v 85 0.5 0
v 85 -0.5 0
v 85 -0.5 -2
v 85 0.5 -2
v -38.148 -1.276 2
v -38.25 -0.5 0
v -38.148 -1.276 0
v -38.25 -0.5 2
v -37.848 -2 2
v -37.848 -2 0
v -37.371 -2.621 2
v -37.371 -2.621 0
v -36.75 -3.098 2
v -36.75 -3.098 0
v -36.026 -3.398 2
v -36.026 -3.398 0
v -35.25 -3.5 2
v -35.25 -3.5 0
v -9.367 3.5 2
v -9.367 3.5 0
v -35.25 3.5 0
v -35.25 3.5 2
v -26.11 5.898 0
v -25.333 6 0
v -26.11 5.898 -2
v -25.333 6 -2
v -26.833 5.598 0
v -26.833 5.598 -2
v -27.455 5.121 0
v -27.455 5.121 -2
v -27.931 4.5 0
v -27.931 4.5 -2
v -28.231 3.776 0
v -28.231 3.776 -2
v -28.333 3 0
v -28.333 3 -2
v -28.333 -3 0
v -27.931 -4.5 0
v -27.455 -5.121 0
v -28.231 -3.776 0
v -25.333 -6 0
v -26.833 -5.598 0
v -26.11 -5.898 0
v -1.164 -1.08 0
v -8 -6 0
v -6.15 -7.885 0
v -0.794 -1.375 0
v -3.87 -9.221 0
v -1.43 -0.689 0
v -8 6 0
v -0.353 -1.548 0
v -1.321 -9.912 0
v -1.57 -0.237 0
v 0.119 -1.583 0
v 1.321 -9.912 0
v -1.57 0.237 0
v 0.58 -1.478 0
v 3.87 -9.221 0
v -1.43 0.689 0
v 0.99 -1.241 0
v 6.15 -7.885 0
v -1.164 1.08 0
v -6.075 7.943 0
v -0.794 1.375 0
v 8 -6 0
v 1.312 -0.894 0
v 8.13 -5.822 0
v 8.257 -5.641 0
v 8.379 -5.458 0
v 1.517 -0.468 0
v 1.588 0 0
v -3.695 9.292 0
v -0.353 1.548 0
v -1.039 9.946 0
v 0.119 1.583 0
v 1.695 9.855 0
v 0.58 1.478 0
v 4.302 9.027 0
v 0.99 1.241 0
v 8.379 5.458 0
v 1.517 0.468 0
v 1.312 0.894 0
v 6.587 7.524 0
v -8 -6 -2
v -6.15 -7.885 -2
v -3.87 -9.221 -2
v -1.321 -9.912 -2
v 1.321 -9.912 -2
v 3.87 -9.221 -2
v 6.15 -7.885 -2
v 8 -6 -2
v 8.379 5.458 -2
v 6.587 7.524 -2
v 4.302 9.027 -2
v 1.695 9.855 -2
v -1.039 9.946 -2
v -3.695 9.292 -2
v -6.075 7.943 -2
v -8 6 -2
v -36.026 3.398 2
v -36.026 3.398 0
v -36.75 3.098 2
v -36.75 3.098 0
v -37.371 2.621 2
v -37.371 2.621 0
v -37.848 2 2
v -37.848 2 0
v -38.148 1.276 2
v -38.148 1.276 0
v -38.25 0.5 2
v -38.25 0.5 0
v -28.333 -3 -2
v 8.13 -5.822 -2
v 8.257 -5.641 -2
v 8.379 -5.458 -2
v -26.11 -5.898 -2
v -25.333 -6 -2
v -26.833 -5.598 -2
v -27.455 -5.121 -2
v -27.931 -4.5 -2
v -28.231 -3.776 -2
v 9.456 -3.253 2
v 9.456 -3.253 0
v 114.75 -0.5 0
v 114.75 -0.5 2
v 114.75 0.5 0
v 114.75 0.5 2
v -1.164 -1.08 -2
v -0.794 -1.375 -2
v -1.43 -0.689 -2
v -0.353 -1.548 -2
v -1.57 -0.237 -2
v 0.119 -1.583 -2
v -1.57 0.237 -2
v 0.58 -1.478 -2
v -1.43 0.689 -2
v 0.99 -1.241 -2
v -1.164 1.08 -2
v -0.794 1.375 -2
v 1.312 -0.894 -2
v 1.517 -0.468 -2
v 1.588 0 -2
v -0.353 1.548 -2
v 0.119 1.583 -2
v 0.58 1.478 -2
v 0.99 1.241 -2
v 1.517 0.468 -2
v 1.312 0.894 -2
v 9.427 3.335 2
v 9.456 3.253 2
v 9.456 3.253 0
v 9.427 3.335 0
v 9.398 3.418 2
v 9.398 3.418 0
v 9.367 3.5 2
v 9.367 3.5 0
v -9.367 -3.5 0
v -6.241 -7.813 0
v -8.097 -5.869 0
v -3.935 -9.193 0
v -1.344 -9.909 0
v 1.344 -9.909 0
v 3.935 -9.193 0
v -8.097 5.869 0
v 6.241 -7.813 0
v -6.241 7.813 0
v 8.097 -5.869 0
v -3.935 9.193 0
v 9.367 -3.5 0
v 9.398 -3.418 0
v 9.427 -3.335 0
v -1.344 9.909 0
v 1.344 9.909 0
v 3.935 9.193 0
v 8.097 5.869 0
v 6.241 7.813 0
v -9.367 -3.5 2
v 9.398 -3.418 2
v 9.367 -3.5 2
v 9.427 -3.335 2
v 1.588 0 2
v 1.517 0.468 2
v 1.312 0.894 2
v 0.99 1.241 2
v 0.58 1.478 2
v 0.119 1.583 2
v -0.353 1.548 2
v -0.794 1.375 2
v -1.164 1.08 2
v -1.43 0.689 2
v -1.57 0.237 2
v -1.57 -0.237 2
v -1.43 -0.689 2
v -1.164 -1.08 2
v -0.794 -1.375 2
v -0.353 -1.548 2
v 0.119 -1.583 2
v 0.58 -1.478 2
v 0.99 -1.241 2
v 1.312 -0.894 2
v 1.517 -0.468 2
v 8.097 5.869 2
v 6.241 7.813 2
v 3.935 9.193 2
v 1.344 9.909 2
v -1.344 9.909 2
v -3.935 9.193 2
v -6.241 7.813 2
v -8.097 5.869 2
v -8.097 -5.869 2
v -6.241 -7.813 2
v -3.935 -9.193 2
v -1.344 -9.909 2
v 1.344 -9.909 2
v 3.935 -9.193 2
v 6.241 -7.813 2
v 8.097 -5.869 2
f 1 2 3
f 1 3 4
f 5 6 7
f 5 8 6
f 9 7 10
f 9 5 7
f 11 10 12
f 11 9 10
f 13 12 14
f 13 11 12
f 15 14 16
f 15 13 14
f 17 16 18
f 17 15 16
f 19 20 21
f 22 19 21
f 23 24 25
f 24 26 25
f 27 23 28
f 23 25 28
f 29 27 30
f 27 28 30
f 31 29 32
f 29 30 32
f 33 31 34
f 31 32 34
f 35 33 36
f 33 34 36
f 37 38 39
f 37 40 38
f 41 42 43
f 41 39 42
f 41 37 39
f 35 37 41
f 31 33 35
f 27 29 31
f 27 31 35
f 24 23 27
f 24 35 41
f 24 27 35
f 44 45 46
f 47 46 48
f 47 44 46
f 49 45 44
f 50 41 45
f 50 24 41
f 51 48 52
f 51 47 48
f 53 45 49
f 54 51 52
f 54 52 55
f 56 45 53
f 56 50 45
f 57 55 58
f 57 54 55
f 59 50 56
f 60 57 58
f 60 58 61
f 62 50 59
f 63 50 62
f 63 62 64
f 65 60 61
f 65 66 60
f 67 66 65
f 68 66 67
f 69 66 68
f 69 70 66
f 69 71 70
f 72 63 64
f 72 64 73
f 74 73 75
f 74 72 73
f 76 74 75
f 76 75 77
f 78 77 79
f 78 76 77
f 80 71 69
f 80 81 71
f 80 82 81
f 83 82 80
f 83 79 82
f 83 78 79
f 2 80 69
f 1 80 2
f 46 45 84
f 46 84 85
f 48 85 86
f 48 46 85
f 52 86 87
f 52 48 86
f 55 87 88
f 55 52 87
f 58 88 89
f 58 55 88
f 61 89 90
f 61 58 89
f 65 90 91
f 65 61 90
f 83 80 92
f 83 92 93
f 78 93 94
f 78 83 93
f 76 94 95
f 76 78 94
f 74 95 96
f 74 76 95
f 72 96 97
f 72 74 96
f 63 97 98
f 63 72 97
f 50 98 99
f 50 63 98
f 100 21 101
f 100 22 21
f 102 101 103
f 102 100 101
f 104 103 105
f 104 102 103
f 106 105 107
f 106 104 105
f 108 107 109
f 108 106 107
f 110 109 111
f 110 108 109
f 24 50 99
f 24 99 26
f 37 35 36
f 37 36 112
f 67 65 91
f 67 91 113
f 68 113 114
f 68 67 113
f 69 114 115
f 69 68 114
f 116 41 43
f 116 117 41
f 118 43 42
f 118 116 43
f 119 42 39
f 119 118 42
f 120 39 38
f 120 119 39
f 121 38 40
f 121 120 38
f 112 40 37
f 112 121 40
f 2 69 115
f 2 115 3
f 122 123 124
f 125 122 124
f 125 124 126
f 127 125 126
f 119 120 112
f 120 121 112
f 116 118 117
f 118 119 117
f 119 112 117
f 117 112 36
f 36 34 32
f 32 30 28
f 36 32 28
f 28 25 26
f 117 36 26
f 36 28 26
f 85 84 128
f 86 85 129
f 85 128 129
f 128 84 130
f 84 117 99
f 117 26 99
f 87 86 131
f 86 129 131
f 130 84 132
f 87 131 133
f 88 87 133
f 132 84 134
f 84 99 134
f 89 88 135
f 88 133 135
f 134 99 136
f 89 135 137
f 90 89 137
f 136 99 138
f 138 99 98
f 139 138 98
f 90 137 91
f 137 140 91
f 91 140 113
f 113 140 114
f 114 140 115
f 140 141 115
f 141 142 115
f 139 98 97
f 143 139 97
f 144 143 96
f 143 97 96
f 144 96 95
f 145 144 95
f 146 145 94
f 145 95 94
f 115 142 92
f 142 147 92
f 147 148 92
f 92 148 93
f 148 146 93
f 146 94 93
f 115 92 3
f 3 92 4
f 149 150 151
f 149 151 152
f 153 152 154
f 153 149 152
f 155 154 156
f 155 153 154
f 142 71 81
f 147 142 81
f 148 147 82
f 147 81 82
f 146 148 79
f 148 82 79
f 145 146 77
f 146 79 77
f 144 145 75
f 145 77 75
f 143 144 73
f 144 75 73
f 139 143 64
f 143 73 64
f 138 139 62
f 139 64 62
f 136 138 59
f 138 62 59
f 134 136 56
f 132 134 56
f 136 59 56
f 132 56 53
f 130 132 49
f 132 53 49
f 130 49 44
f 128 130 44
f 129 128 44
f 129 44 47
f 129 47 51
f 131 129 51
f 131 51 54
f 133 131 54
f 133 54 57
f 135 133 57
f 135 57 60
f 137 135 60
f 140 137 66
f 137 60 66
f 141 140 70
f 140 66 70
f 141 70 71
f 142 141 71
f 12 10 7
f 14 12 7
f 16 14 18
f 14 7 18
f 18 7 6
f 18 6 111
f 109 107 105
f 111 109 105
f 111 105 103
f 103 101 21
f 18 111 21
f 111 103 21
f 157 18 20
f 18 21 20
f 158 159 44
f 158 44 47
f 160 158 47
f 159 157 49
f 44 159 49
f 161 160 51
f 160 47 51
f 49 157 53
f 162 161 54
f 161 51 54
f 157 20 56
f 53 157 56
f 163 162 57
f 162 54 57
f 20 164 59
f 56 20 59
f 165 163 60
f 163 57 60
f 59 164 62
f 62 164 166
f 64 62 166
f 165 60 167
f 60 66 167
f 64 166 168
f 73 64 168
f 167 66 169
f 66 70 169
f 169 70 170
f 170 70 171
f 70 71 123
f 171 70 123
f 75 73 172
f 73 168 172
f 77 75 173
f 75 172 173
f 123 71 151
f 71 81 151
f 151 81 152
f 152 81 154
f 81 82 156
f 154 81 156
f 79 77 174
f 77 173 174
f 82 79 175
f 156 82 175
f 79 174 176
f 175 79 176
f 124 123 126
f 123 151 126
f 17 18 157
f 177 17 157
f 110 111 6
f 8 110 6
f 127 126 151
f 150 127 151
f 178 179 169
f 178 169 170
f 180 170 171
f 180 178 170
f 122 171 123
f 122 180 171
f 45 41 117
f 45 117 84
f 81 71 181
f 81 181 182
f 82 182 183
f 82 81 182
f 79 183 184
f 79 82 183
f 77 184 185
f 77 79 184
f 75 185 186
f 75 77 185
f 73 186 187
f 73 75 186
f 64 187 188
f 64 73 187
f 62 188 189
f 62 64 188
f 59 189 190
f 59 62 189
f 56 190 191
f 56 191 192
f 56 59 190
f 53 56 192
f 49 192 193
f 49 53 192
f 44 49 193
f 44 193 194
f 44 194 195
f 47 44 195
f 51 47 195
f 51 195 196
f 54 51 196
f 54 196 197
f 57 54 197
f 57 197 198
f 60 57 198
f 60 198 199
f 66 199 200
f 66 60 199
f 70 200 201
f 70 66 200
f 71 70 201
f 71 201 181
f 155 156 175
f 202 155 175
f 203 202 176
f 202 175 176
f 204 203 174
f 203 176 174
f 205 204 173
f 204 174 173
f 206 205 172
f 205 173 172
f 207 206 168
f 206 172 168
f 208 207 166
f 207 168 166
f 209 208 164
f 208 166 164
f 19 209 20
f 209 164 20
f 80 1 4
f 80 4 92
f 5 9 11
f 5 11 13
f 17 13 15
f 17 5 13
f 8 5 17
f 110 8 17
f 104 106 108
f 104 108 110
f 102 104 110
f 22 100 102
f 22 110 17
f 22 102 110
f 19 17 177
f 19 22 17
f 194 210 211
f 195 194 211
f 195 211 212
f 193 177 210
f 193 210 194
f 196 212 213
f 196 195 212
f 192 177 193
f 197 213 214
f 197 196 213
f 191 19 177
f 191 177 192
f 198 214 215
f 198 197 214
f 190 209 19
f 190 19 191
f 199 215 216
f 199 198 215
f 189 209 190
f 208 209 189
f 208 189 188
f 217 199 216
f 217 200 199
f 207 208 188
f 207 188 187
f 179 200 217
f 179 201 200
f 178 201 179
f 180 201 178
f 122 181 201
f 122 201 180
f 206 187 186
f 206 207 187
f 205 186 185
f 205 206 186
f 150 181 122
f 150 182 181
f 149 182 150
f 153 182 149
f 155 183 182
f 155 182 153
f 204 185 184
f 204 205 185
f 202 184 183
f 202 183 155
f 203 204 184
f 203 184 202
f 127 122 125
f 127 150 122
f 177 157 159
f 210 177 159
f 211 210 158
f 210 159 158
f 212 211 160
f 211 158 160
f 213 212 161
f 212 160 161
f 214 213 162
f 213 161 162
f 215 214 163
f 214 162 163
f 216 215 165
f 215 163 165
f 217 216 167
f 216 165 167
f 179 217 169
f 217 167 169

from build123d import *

# Parameters (mm, degrees)
F4_R         = 1.5875
F5_DEPTH     = 2
F6_R         = 1.5875
F7_DEPTH     = 2
F8_T4_DEPTH  = 443.9658863068
F8_S5_R      = 10
F8_T6_DEPTH  = 228
F8_T10_DEPTH = 443.9658863068
F8_S11_R     = 10
F8_T12_DEPTH = 228
F9_T4_DEPTH  = 598.692462338
F9_S5_R      = 10
F9_T6_DEPTH  = 306
F9_T10_DEPTH = 598.692462338
F9_S11_R     = 10
F9_T12_DEPTH = 306
F10_R        = 3
F10_2_R      = 3


# Not quite as in the source:
# - a fillet or chamfer that OpenCascade refuses, or shapes differently, is made with other operations: its cross-section is extruded or revolved along the edge and cut away or added


with BuildPart() as f5:
    # F4 (on Top) → F5 (new body)
    with BuildSketch(Plane.XY):
        with BuildLine():
            Line((-9.3674969976, 3.5), (-38.25, 3.5))
            Line((-38.25, 3.5), (-38.25, -3.5))
            Line((-38.25, -3.5), (-9.3674969976, -3.5))
            ThreePointArc((-9.3674969976, -3.5), (-10, 0), (-9.3674969976, 3.5))
        make_face()
        with BuildLine():
            ThreePointArc((9.3674969976, 3.5), (0, 10), (-9.3674969976, 3.5))
            Line((-9.3674969976, 3.5), (9.3674969976, 3.5))
        make_face()
        with BuildLine():
            Line((9.3674969976, 3.5), (-9.3674969976, 3.5))
            ThreePointArc((-9.3674969976, 3.5), (-10, 0), (-9.3674969976, -3.5))
            Line((-9.3674969976, -3.5), (9.3674969976, -3.5))
            ThreePointArc((9.3674969976, -3.5), (9.8406038935, -1.7783461452), (10, 0))
            ThreePointArc((10, 0), (9.8406038935, 1.7783461452), (9.3674969976, 3.5))
        make_face()
        Circle(F4_R, mode=Mode.SUBTRACT)
        with BuildLine():
            Line((114.75, 3.5), (9.3674969976, 3.5))
            ThreePointArc((9.3674969976, 3.5), (9.8406038935, 1.7783461452), (10, 0))
            ThreePointArc((10, 0), (9.8406038935, -1.7783461452), (9.3674969976, -3.5))
            Line((9.3674969976, -3.5), (114.75, -3.5))
            Line((114.75, -3.5), (114.75, 3.5))
        make_face()
        with BuildLine():
            Line((9.3674969976, -3.5), (-9.3674969976, -3.5))
            ThreePointArc((-9.3674969976, -3.5), (0, -10), (9.3674969976, -3.5))
        make_face()
    extrude(amount=F5_DEPTH)

    # F9: chamfer of 114.75 x 3 on 2 edges, made by hand


with BuildPart() as f7:
    # F6 (on Top) → F7 (new body)
    with BuildSketch(Plane.XY):
        with BuildLine():
            Line((-8, 6), (-28.3333333333, 6))
            Line((-28.3333333333, 6), (-28.3333333333, -6))
            Line((-28.3333333333, -6), (-8, -6))
            ThreePointArc((-8, -6), (-10, 0), (-8, 6))
        make_face()
        with BuildLine():
            ThreePointArc((8, 6), (0, 10), (-8, 6))
            Line((-8, 6), (8, 6))
        make_face()
        with BuildLine():
            Line((8, 6), (-8, 6))
            ThreePointArc((-8, 6), (-10, 0), (-8, -6))
            Line((-8, -6), (8, -6))
            ThreePointArc((8, -6), (9.4868329805, -3.1622776602), (10, 0))
            ThreePointArc((10, 0), (9.4868329805, 3.1622776602), (8, 6))
        make_face()
        Circle(F6_R, mode=Mode.SUBTRACT)
        with BuildLine():
            Line((85, 6), (8, 6))
            ThreePointArc((8, 6), (9.4868329805, 3.1622776602), (10, 0))
            ThreePointArc((10, 0), (9.4868329805, -3.1622776602), (8, -6))
            Line((8, -6), (85, -6))
            Line((85, -6), (85, 6))
        make_face()
        with BuildLine():
            Line((8, -6), (-8, -6))
            ThreePointArc((-8, -6), (0, -10), (8, -6))
        make_face()
    extrude(amount=-F7_DEPTH)

    # F8: chamfer of 85 x 5.5 on 2 edges, made by hand


with BuildPart() as f8_tool2:
    # F8_s3 → F8_t4 (new body)
    with BuildSketch(Plane.XY.offset(220.9829431534)):
        Polygon((0, -6), (85, -0.5), (85, -6), align=None)
    extrude(amount=-F8_T4_DEPTH)

    # F8_s5 → F8_t6 (cut, symmetric)
    with BuildSketch(Plane.XY.offset(-1)):
        Circle(F8_S5_R)
    extrude(amount=F8_T6_DEPTH, both=True, mode=Mode.SUBTRACT)


with BuildPart() as f7_1:
    add(f7.part)

    # F8_t1: cut F8_tool2
    add(f8_tool2.part, mode=Mode.SUBTRACT)


with BuildPart() as f8_tool8:
    # F8_s9 → F8_t10 (new body)
    with BuildSketch(Plane.XY.offset(220.9829431534)):
        Polygon((85, 0.5), (0, 6), (85, 6), align=None)
    extrude(amount=-F8_T10_DEPTH)

    # F8_s11 → F8_t12 (cut, symmetric)
    with BuildSketch(Plane.XY.offset(-1)):
        Circle(F8_S11_R)
    extrude(amount=F8_T12_DEPTH, both=True, mode=Mode.SUBTRACT)


with BuildPart() as f7_2:
    add(f7_1.part)

    # F8_t7: cut F8_tool8
    add(f8_tool8.part, mode=Mode.SUBTRACT)

    # F10#2
    f10_2_edges = [f7_2.edges().sort_by_distance(p)[0] for p in [
        (-28.333333, 6, -1),
        (-28.333333, -6, -1),
    ]]
    fillet(f10_2_edges, radius=F10_2_R)


with BuildPart() as f9_tool2:
    # F9_s3 → F9_t4 (new body)
    with BuildSketch(Plane.XY.offset(-298.346231169)):
        Polygon((0, -3.5), (114.75, -0.5), (114.75, -3.5), align=None)
    extrude(amount=F9_T4_DEPTH)

    # F9_s5 → F9_t6 (cut, symmetric)
    with BuildSketch(Plane.XY.offset(1)):
        Circle(F9_S5_R)
    extrude(amount=F9_T6_DEPTH, both=True, mode=Mode.SUBTRACT)


with BuildPart() as f5_1:
    add(f5.part)

    # F9_t1: cut F9_tool2
    add(f9_tool2.part, mode=Mode.SUBTRACT)


with BuildPart() as f9_tool8:
    # F9_s9 → F9_t10 (new body)
    with BuildSketch(Plane.XY.offset(-298.346231169)):
        Polygon((114.75, 0.5), (0, 3.5), (114.75, 3.5), align=None)
    extrude(amount=F9_T10_DEPTH)

    # F9_s11 → F9_t12 (cut, symmetric)
    with BuildSketch(Plane.XY.offset(1)):
        Circle(F9_S11_R)
    extrude(amount=F9_T12_DEPTH, both=True, mode=Mode.SUBTRACT)


with BuildPart() as f5_2:
    add(f5_1.part)

    # F9_t7: cut F9_tool8
    add(f9_tool8.part, mode=Mode.SUBTRACT)

    # F10
    f10_edges = [f5_2.edges().sort_by_distance(p)[0] for p in [
        (-38.25, 3.5, 1),
        (-38.25, -3.5, 1),
    ]]
    fillet(f10_edges, radius=F10_R)


solid = Compound([f7_2.part, f5_2.part])
